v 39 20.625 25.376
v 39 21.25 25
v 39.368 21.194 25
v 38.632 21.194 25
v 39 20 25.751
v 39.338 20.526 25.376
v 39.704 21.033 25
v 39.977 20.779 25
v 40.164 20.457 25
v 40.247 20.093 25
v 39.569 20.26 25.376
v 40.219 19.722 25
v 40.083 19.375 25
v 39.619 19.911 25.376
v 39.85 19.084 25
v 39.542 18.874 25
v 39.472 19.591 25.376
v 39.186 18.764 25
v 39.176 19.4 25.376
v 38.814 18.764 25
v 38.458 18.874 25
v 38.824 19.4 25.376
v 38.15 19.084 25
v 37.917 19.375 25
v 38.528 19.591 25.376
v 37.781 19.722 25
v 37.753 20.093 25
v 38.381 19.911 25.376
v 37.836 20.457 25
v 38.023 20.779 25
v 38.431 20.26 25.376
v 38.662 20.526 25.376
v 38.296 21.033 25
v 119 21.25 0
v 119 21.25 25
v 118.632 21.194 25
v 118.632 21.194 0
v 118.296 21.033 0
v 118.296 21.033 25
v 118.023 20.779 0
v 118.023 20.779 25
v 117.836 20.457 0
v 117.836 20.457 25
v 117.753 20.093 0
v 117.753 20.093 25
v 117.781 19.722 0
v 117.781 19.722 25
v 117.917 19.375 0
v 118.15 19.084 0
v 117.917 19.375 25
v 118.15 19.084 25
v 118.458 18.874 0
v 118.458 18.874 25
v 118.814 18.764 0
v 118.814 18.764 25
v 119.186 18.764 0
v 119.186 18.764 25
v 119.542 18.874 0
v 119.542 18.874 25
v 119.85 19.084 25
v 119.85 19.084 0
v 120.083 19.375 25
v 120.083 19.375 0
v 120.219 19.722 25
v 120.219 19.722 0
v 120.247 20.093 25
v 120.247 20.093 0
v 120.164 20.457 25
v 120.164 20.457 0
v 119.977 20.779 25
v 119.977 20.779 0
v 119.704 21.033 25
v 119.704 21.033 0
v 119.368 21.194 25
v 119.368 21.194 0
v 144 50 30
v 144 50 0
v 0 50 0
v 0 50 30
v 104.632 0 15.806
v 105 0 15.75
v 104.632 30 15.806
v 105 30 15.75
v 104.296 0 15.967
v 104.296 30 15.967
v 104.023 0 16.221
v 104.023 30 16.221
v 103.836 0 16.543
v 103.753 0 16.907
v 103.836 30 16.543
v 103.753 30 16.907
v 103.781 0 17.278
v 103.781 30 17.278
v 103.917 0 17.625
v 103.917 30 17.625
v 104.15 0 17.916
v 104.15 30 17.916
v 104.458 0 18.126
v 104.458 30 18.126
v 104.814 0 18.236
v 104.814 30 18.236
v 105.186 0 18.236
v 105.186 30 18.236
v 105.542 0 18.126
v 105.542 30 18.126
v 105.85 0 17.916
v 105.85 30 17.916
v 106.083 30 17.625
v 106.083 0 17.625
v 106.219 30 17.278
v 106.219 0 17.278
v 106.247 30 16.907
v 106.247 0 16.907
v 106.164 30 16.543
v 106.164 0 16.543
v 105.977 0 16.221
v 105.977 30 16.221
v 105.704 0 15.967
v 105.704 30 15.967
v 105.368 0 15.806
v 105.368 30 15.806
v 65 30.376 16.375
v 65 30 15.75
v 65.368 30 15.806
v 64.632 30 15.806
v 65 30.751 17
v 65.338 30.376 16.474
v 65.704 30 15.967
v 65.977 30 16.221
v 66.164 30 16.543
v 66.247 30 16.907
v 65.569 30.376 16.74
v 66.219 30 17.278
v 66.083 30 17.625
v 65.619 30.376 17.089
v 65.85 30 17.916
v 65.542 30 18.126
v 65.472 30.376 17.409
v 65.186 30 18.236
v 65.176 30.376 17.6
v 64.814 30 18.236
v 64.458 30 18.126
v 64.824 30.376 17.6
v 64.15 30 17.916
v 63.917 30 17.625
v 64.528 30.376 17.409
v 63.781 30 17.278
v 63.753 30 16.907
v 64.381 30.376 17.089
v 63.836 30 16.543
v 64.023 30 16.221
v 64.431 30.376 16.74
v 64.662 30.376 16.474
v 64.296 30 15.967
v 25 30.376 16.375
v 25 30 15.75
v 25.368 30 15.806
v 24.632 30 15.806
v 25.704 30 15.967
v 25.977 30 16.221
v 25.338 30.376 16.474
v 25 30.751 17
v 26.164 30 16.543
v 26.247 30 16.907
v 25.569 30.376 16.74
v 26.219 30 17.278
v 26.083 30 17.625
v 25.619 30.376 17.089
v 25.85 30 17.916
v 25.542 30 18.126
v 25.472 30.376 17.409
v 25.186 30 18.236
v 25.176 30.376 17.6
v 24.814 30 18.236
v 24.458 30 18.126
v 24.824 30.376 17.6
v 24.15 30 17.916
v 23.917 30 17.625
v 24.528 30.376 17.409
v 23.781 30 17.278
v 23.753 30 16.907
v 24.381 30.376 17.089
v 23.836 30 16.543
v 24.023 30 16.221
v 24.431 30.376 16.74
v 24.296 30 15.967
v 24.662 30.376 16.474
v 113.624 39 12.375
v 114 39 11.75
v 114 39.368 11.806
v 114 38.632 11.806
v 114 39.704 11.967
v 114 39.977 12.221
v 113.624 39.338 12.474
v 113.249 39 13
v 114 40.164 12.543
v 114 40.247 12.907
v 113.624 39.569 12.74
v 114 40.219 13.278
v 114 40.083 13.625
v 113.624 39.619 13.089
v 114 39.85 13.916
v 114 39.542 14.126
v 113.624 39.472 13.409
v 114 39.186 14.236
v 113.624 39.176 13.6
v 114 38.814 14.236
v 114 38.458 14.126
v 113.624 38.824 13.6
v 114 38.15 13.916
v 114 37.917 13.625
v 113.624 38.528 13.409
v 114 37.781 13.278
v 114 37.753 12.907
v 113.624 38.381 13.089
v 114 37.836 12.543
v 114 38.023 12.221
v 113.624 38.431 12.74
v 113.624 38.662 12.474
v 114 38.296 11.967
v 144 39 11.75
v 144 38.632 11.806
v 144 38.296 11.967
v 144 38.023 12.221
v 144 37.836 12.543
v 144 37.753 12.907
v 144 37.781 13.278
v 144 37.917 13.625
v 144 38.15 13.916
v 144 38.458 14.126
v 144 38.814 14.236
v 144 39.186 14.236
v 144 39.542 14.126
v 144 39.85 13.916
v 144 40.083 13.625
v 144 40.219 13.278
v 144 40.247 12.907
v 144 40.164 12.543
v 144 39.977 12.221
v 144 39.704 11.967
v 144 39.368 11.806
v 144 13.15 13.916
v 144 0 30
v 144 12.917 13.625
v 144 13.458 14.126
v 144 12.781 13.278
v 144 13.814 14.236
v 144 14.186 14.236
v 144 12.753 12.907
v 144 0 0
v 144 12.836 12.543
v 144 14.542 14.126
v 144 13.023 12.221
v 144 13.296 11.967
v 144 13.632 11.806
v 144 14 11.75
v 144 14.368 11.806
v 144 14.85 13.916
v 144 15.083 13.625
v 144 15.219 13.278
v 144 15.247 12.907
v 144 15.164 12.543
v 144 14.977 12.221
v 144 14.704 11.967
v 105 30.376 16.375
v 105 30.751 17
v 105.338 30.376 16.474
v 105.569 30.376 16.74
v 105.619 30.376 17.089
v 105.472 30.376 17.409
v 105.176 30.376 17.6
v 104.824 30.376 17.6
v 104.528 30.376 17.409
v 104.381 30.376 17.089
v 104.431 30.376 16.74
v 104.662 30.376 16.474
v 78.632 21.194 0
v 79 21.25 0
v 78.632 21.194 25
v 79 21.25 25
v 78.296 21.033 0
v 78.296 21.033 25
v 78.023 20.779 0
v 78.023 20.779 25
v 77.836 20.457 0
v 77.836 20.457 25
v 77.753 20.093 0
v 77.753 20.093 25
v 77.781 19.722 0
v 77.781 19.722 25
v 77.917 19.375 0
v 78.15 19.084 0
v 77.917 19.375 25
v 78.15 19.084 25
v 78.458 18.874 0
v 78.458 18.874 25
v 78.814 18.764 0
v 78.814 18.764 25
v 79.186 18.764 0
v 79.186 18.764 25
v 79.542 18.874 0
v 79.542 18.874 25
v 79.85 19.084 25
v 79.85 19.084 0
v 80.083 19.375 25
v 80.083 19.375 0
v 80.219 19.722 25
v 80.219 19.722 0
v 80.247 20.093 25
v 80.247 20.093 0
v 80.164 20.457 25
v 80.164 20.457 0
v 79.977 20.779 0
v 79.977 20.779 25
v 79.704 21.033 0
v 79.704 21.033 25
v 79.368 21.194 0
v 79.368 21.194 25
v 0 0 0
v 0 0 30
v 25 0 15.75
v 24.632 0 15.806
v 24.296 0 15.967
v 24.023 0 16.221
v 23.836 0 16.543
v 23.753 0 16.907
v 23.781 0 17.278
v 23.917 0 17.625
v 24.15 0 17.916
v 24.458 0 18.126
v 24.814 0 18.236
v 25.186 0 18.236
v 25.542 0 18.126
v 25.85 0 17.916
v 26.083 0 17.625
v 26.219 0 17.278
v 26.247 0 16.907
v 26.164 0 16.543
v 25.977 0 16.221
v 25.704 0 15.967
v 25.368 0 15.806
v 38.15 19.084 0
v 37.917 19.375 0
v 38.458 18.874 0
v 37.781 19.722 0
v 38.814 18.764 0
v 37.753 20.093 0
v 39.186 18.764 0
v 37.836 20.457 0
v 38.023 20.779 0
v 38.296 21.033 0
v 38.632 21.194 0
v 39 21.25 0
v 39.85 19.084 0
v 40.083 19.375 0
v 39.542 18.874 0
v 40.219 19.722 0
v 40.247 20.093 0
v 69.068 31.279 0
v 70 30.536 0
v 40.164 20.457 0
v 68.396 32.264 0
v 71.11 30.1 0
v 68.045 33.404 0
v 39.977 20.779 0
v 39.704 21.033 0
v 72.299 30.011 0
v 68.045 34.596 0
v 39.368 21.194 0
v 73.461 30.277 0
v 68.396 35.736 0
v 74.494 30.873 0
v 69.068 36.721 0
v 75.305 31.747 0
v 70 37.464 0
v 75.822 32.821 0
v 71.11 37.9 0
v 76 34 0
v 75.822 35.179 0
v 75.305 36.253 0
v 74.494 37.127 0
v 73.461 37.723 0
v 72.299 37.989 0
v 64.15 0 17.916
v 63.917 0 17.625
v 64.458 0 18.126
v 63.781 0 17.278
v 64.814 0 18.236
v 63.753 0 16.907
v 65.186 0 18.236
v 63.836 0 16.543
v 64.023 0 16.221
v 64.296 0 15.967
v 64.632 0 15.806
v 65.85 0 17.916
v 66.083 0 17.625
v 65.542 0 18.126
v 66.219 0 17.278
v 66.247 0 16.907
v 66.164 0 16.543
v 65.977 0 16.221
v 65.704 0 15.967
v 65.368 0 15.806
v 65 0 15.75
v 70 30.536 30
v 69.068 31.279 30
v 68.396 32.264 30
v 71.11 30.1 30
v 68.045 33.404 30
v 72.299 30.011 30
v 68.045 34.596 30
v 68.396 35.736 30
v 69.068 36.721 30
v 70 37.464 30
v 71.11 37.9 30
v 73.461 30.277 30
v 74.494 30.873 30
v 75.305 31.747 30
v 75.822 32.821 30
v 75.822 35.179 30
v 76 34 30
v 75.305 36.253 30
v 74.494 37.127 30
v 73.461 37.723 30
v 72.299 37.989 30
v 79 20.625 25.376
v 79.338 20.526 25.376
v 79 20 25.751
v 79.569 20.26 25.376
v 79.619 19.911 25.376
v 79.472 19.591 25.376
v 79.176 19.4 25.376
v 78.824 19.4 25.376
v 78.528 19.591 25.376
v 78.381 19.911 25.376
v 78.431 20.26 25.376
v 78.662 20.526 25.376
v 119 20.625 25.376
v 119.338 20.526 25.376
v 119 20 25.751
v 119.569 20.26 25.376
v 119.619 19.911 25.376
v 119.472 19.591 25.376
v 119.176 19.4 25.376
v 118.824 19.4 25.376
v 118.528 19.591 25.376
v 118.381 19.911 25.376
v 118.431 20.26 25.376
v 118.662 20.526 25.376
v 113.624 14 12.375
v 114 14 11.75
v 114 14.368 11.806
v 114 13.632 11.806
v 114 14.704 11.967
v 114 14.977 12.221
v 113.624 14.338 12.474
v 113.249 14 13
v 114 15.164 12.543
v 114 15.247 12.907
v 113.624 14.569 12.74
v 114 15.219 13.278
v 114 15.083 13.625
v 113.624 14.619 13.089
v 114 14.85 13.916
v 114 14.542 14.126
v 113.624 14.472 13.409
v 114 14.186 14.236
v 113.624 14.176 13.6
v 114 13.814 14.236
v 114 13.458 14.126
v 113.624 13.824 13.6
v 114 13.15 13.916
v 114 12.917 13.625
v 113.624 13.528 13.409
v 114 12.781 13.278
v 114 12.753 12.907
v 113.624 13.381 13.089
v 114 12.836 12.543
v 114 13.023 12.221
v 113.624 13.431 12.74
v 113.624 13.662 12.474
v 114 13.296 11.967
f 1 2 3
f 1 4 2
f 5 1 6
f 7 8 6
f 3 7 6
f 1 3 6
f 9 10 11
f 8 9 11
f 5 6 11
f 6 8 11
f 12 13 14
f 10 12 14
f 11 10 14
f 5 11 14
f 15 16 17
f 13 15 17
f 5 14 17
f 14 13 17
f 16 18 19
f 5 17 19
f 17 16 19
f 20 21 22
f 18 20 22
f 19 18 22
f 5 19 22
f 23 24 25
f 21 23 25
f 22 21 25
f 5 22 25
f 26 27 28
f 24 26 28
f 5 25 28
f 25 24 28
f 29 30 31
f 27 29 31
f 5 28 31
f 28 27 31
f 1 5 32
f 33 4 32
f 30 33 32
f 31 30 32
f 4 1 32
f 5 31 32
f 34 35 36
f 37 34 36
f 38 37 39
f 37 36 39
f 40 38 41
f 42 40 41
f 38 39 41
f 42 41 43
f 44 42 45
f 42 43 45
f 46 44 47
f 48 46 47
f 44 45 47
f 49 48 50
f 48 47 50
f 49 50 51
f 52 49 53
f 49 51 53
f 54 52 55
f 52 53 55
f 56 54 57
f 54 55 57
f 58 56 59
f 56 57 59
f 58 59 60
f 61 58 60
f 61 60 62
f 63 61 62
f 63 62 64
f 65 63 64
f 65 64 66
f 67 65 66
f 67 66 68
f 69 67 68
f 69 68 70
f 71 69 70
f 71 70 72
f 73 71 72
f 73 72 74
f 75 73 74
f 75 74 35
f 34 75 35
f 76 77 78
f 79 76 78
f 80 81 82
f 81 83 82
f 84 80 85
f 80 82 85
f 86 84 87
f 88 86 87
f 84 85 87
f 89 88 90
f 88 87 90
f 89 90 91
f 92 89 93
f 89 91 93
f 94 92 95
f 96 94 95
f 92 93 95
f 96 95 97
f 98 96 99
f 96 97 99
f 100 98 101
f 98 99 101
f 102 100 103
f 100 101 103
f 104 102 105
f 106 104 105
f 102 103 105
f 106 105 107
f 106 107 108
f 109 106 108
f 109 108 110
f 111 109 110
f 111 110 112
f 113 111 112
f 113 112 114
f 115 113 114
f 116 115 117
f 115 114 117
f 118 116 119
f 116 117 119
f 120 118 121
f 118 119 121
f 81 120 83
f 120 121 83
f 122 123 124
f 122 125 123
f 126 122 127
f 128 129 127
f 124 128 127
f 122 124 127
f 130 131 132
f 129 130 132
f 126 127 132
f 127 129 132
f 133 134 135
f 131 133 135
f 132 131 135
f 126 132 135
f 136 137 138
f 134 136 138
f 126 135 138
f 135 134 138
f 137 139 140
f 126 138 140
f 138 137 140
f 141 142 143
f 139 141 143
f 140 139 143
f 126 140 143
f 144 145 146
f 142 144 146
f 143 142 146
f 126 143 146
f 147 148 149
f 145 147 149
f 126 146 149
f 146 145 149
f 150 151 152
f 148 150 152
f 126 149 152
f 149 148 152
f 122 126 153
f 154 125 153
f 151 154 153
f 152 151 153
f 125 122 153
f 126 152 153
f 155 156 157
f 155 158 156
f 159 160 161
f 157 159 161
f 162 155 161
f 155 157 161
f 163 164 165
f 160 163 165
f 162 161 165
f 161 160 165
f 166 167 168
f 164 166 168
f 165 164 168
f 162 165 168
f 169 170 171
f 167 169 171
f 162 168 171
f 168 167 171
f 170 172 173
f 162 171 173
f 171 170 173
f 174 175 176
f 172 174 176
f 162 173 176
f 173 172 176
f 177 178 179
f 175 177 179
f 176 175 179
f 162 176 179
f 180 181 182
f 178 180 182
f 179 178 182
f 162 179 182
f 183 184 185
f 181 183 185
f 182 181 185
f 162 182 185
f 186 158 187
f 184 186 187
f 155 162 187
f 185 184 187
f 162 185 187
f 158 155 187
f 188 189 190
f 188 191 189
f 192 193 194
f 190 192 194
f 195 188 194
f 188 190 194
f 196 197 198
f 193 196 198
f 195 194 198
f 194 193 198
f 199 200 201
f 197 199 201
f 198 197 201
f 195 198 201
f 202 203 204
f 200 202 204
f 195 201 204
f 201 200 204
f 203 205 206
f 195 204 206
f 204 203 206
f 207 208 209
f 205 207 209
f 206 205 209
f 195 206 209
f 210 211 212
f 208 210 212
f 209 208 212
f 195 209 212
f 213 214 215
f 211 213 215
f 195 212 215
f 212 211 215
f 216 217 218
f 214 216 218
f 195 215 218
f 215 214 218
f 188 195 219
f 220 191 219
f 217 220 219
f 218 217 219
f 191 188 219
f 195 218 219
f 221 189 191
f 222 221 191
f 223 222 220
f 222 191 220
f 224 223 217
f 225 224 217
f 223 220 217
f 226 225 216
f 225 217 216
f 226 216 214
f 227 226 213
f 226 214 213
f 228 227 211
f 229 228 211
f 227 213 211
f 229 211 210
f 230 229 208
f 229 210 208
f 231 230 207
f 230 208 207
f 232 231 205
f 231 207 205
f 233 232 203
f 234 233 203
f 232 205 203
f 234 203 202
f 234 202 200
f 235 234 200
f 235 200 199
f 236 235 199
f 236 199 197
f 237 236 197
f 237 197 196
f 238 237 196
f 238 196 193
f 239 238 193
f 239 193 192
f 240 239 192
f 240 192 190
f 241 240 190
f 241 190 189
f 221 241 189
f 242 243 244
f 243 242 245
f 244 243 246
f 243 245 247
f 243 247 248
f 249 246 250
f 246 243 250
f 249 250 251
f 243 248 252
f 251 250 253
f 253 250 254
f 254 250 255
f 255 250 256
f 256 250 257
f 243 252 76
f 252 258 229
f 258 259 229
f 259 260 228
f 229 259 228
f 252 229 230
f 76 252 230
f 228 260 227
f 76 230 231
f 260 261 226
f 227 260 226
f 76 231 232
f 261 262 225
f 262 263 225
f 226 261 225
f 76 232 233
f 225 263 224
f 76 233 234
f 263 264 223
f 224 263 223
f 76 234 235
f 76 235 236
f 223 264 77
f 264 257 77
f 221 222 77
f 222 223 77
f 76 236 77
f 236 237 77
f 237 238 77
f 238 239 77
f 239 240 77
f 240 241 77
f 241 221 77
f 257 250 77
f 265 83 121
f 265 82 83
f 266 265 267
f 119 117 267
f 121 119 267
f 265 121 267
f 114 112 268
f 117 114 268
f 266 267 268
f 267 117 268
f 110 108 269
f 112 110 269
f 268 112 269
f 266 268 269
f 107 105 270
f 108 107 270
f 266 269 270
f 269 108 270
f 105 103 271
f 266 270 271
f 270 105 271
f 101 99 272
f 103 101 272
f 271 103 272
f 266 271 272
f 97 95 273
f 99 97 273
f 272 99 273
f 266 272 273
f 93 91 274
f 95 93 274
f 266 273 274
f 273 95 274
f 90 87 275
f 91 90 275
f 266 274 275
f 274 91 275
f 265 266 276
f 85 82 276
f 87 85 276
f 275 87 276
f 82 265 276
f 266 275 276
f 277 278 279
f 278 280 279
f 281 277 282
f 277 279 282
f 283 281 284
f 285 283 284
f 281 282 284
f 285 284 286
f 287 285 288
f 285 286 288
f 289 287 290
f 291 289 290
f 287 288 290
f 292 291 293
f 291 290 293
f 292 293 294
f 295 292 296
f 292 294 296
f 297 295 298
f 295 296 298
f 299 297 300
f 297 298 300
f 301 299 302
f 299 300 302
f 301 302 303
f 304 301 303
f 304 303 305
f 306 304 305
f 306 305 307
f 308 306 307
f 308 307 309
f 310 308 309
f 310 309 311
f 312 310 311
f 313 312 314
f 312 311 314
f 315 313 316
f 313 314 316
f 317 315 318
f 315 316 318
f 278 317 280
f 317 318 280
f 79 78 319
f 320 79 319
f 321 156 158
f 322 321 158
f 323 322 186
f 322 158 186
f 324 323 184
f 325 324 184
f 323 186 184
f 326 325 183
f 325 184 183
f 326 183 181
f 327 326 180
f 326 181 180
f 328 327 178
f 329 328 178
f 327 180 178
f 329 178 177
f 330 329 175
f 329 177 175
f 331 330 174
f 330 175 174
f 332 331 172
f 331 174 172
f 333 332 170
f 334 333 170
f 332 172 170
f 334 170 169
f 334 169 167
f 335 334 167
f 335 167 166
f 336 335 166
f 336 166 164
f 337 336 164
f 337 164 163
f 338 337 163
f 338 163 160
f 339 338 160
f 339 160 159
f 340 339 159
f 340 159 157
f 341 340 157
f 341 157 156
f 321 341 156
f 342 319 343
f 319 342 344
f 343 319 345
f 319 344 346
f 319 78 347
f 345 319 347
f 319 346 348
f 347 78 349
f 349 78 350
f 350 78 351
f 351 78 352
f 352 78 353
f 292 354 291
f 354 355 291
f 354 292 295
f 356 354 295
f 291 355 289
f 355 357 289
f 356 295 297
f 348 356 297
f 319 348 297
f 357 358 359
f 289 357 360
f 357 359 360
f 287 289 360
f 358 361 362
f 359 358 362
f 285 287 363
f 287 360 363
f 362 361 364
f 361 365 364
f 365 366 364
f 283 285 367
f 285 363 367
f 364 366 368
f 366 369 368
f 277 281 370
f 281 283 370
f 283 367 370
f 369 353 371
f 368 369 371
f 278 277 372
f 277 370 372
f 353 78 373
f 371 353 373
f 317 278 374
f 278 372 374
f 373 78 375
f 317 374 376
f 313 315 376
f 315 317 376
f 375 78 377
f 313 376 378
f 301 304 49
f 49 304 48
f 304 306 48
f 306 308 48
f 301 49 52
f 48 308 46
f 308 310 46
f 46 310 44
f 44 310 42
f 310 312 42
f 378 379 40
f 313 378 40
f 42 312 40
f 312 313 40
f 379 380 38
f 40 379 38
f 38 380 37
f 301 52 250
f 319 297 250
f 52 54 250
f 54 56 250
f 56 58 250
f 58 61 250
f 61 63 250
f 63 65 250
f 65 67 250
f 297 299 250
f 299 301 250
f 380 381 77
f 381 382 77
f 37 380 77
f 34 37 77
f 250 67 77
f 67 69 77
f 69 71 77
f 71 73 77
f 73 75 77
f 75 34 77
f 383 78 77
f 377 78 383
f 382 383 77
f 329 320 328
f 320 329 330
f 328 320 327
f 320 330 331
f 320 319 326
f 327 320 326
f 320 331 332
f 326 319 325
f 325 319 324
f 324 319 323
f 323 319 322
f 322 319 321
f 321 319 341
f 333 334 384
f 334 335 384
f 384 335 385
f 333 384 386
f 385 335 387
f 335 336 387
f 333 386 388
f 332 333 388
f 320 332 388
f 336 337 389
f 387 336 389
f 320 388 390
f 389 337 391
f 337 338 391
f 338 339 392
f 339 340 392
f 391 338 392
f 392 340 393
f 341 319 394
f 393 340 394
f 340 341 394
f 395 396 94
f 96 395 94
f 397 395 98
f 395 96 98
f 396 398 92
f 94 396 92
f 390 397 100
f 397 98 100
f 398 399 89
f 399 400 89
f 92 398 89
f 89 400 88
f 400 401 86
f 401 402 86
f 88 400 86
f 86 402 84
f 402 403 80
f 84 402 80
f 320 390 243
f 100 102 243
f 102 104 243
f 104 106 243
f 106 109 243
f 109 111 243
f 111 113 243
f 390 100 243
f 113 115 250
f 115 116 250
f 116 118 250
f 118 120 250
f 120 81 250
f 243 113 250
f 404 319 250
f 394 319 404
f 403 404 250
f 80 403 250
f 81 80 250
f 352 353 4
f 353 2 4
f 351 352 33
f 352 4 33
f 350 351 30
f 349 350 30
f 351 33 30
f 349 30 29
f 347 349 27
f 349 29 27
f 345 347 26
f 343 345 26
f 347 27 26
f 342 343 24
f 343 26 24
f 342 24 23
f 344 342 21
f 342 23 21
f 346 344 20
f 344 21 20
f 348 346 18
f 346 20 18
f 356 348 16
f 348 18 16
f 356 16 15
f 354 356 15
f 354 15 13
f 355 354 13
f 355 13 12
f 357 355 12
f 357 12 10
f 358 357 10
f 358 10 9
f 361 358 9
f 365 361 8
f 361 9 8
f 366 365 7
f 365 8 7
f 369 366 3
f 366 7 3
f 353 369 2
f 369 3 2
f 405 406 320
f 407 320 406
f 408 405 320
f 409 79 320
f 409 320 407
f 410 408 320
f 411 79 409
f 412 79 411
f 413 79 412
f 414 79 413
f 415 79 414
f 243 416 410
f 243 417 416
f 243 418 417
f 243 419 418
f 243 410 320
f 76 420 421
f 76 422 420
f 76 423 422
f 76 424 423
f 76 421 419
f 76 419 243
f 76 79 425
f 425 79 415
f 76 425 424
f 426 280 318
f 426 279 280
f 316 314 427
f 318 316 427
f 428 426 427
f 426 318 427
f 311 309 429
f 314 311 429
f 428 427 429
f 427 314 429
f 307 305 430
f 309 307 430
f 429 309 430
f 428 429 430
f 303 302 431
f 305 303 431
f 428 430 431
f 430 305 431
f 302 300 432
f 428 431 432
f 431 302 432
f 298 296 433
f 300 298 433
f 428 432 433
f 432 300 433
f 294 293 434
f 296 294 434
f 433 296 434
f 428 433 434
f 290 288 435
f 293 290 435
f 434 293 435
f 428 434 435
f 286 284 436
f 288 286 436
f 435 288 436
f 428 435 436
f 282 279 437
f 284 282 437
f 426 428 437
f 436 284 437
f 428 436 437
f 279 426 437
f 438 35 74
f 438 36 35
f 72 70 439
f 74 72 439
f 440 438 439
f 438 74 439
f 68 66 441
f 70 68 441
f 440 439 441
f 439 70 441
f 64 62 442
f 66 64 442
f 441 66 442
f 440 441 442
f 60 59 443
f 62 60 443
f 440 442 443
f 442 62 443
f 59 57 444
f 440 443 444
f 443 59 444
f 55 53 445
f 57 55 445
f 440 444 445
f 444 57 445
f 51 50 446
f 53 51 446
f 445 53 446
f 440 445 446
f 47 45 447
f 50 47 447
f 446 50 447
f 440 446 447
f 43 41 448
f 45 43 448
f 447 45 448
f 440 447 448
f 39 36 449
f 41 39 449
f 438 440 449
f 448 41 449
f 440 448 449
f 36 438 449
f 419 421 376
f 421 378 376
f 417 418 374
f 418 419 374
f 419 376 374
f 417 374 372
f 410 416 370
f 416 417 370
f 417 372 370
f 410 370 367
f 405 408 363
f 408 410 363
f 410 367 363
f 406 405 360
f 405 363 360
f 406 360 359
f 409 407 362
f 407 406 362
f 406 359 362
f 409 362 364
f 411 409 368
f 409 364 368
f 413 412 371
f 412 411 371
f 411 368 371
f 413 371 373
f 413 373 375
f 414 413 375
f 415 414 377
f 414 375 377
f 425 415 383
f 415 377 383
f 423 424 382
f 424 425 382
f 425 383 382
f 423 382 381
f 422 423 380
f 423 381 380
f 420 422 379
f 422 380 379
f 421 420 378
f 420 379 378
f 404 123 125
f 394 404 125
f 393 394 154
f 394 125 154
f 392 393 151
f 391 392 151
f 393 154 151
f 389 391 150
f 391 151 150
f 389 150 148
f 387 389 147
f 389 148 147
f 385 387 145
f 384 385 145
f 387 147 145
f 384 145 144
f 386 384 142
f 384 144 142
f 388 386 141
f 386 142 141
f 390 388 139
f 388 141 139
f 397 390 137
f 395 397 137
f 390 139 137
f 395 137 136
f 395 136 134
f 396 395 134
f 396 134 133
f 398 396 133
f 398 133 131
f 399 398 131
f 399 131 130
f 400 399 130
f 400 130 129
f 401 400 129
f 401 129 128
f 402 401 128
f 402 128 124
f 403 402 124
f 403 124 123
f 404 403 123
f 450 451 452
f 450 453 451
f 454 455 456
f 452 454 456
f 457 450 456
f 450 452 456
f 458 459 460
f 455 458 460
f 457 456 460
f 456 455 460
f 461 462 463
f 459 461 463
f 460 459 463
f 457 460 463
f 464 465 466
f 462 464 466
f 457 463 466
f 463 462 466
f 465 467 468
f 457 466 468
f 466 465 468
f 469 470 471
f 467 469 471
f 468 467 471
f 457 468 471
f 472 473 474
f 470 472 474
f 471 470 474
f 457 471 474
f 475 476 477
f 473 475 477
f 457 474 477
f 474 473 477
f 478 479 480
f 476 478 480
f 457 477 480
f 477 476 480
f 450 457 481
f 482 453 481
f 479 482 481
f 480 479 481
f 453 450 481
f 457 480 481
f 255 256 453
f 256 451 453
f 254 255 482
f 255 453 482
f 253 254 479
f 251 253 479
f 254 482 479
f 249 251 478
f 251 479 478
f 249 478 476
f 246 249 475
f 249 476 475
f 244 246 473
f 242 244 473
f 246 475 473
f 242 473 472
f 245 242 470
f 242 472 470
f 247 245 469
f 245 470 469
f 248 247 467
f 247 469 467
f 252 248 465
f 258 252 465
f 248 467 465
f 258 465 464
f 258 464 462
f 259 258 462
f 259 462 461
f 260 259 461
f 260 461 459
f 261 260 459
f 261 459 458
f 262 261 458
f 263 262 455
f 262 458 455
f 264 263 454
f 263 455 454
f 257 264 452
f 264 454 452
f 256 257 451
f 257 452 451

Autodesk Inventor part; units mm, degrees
ref_plane "YZ Plane" through (0, 0, 0) normal (1, 0, 0) x (0, 1, 0)
ref_plane "XZ Plane" through (0, 0, 0) normal (0, 1, 0) x (-1, 0, 0)
ref_plane "XY Plane" through (0, 0, 0) normal (0, 0, 1) x (1, 0, 0)
sketch "Skizze1" plane through (0, 0, 0) normal (0, 0, 1) x (1, 0, 0)
  line L0 (0, 0) -> (144, 0)
  line L1 (144, 50) -> (0, 50)
  line L2 (72, 50) -> (72, 0) construction
  circle A0 centre (72, 34) radius 4
  line L3 (0, 50) -> (0, 0)
  line L4 (144, 0) -> (144, 50)
  line L5 (0, 20) -> (144, 20) construction
  line L6 (0, 34) -> (144, 34) construction
  circle A1 centre (105, 20) radius 1.5
  circle A2 centre (25, 20) radius 1.5
  circle A3 centre (65, 20) radius 1.5
  dimension "d17" = 8
  dimension "d207" = 50
  dimension "d224" = 144
  dimension "d225" = 20
  dimension "d226" = 34
  dimension "d228" = 3
  dimension "d229" = 3
  dimension "d232" = 3
  dimension "d233" = 7
  dimension "d234" = 40
  dimension "d235" = 40
extrude "Extrusion1" add sketch "Skizze1" along normal blind 30 contours L3 L1 L4 L0 | A1 | A2 | A3
sketch "Skizze7" plane through (0, 0, 0) normal (0, 0, -1) x (-1, 0, 0)
  line L0 (0, 0) -> (-144, 0) construction
  line L1 (-144, 50) -> (0, 50) construction
  line L2 (-144, 0) -> (-144, 50) construction
  line L3 (0, 50) -> (0, 0) construction
  line L4 (-144, 0) -> (-144, 50) projected
  line L5 (-144, 20) -> (0, 20) construction
  line L6 (0, 0) -> (-144, 0) construction
  line L7 (-72, 0) -> (-72, 50) construction
  point P0 (-79, 20)
  point P1 (-119, 20)
  point P2 (-39, 20)
  dimension "d236" = 7
  dimension "d237" = 20
  dimension "d238" = 40
  dimension "d239" = 40
hole "Bohrung19" at (79, 20, 0) at (119, 20, 0) at (39, 20, 0) direction (0, 0, 1) diameter 2.5 depth 25 tip angle 118
sketch "Skizze8" plane through (0, 0, 0) normal (0, -1, 0) x (1, 0, 0)
  line L0 (144, 0) -> (144, 30) construction
  line L1 (0, 30) -> (144, 30) construction
  line L2 (0, 0) -> (144, 0) construction
  line L3 (144, 0) -> (144, 30) construction
  line L4 (0, 30) -> (144, 30) construction
  line L5 (0, 0) -> (0, 30) construction
  line L6 (144, 17) -> (0, 17) construction
  line L7 (25, 30) -> (25, 0) construction
  line L8 (0, 0) -> (144, 0) construction
  point P0 (25, 17)
  point P1 (65, 17)
  point P2 (105, 17)
  dimension "d247" = 17
  dimension "d248" = 25
  dimension "d249" = 40
  dimension "d250" = 40
hole "Bohrung20" at (25, 0, 17) at (65, 0, 17) at (105, 0, 17) direction (0, 1, 0) diameter 2.5 depth 30 tip angle 118
sketch "Skizze9" plane through (144, 0, 0) normal (1, 0, 0) x (0, 0, -1)
  line L0 (0, 0) -> (0, 50) construction
  line L1 (0, 50) -> (-30, 50) construction
  line L2 (-30, 0) -> (-30, 50) construction
  line L3 (0, 0) -> (-30, 0) construction
  line L4 (0, 0) -> (-30, 0) construction
  line L5 (-13, 0) -> (-13, 50) construction
  point P0 (-13, 14)
  point P1 (-13, 39)
  dimension "d258" = 13
  dimension "d259" = 14
  dimension "d261" = 25
hole "Bohrung21" at (144, 14, 13) at (144, 39, 13) direction (-1, 0, 0) diameter 2.5 depth 30 tip angle 118
properties part number "licht_150_support_right"
